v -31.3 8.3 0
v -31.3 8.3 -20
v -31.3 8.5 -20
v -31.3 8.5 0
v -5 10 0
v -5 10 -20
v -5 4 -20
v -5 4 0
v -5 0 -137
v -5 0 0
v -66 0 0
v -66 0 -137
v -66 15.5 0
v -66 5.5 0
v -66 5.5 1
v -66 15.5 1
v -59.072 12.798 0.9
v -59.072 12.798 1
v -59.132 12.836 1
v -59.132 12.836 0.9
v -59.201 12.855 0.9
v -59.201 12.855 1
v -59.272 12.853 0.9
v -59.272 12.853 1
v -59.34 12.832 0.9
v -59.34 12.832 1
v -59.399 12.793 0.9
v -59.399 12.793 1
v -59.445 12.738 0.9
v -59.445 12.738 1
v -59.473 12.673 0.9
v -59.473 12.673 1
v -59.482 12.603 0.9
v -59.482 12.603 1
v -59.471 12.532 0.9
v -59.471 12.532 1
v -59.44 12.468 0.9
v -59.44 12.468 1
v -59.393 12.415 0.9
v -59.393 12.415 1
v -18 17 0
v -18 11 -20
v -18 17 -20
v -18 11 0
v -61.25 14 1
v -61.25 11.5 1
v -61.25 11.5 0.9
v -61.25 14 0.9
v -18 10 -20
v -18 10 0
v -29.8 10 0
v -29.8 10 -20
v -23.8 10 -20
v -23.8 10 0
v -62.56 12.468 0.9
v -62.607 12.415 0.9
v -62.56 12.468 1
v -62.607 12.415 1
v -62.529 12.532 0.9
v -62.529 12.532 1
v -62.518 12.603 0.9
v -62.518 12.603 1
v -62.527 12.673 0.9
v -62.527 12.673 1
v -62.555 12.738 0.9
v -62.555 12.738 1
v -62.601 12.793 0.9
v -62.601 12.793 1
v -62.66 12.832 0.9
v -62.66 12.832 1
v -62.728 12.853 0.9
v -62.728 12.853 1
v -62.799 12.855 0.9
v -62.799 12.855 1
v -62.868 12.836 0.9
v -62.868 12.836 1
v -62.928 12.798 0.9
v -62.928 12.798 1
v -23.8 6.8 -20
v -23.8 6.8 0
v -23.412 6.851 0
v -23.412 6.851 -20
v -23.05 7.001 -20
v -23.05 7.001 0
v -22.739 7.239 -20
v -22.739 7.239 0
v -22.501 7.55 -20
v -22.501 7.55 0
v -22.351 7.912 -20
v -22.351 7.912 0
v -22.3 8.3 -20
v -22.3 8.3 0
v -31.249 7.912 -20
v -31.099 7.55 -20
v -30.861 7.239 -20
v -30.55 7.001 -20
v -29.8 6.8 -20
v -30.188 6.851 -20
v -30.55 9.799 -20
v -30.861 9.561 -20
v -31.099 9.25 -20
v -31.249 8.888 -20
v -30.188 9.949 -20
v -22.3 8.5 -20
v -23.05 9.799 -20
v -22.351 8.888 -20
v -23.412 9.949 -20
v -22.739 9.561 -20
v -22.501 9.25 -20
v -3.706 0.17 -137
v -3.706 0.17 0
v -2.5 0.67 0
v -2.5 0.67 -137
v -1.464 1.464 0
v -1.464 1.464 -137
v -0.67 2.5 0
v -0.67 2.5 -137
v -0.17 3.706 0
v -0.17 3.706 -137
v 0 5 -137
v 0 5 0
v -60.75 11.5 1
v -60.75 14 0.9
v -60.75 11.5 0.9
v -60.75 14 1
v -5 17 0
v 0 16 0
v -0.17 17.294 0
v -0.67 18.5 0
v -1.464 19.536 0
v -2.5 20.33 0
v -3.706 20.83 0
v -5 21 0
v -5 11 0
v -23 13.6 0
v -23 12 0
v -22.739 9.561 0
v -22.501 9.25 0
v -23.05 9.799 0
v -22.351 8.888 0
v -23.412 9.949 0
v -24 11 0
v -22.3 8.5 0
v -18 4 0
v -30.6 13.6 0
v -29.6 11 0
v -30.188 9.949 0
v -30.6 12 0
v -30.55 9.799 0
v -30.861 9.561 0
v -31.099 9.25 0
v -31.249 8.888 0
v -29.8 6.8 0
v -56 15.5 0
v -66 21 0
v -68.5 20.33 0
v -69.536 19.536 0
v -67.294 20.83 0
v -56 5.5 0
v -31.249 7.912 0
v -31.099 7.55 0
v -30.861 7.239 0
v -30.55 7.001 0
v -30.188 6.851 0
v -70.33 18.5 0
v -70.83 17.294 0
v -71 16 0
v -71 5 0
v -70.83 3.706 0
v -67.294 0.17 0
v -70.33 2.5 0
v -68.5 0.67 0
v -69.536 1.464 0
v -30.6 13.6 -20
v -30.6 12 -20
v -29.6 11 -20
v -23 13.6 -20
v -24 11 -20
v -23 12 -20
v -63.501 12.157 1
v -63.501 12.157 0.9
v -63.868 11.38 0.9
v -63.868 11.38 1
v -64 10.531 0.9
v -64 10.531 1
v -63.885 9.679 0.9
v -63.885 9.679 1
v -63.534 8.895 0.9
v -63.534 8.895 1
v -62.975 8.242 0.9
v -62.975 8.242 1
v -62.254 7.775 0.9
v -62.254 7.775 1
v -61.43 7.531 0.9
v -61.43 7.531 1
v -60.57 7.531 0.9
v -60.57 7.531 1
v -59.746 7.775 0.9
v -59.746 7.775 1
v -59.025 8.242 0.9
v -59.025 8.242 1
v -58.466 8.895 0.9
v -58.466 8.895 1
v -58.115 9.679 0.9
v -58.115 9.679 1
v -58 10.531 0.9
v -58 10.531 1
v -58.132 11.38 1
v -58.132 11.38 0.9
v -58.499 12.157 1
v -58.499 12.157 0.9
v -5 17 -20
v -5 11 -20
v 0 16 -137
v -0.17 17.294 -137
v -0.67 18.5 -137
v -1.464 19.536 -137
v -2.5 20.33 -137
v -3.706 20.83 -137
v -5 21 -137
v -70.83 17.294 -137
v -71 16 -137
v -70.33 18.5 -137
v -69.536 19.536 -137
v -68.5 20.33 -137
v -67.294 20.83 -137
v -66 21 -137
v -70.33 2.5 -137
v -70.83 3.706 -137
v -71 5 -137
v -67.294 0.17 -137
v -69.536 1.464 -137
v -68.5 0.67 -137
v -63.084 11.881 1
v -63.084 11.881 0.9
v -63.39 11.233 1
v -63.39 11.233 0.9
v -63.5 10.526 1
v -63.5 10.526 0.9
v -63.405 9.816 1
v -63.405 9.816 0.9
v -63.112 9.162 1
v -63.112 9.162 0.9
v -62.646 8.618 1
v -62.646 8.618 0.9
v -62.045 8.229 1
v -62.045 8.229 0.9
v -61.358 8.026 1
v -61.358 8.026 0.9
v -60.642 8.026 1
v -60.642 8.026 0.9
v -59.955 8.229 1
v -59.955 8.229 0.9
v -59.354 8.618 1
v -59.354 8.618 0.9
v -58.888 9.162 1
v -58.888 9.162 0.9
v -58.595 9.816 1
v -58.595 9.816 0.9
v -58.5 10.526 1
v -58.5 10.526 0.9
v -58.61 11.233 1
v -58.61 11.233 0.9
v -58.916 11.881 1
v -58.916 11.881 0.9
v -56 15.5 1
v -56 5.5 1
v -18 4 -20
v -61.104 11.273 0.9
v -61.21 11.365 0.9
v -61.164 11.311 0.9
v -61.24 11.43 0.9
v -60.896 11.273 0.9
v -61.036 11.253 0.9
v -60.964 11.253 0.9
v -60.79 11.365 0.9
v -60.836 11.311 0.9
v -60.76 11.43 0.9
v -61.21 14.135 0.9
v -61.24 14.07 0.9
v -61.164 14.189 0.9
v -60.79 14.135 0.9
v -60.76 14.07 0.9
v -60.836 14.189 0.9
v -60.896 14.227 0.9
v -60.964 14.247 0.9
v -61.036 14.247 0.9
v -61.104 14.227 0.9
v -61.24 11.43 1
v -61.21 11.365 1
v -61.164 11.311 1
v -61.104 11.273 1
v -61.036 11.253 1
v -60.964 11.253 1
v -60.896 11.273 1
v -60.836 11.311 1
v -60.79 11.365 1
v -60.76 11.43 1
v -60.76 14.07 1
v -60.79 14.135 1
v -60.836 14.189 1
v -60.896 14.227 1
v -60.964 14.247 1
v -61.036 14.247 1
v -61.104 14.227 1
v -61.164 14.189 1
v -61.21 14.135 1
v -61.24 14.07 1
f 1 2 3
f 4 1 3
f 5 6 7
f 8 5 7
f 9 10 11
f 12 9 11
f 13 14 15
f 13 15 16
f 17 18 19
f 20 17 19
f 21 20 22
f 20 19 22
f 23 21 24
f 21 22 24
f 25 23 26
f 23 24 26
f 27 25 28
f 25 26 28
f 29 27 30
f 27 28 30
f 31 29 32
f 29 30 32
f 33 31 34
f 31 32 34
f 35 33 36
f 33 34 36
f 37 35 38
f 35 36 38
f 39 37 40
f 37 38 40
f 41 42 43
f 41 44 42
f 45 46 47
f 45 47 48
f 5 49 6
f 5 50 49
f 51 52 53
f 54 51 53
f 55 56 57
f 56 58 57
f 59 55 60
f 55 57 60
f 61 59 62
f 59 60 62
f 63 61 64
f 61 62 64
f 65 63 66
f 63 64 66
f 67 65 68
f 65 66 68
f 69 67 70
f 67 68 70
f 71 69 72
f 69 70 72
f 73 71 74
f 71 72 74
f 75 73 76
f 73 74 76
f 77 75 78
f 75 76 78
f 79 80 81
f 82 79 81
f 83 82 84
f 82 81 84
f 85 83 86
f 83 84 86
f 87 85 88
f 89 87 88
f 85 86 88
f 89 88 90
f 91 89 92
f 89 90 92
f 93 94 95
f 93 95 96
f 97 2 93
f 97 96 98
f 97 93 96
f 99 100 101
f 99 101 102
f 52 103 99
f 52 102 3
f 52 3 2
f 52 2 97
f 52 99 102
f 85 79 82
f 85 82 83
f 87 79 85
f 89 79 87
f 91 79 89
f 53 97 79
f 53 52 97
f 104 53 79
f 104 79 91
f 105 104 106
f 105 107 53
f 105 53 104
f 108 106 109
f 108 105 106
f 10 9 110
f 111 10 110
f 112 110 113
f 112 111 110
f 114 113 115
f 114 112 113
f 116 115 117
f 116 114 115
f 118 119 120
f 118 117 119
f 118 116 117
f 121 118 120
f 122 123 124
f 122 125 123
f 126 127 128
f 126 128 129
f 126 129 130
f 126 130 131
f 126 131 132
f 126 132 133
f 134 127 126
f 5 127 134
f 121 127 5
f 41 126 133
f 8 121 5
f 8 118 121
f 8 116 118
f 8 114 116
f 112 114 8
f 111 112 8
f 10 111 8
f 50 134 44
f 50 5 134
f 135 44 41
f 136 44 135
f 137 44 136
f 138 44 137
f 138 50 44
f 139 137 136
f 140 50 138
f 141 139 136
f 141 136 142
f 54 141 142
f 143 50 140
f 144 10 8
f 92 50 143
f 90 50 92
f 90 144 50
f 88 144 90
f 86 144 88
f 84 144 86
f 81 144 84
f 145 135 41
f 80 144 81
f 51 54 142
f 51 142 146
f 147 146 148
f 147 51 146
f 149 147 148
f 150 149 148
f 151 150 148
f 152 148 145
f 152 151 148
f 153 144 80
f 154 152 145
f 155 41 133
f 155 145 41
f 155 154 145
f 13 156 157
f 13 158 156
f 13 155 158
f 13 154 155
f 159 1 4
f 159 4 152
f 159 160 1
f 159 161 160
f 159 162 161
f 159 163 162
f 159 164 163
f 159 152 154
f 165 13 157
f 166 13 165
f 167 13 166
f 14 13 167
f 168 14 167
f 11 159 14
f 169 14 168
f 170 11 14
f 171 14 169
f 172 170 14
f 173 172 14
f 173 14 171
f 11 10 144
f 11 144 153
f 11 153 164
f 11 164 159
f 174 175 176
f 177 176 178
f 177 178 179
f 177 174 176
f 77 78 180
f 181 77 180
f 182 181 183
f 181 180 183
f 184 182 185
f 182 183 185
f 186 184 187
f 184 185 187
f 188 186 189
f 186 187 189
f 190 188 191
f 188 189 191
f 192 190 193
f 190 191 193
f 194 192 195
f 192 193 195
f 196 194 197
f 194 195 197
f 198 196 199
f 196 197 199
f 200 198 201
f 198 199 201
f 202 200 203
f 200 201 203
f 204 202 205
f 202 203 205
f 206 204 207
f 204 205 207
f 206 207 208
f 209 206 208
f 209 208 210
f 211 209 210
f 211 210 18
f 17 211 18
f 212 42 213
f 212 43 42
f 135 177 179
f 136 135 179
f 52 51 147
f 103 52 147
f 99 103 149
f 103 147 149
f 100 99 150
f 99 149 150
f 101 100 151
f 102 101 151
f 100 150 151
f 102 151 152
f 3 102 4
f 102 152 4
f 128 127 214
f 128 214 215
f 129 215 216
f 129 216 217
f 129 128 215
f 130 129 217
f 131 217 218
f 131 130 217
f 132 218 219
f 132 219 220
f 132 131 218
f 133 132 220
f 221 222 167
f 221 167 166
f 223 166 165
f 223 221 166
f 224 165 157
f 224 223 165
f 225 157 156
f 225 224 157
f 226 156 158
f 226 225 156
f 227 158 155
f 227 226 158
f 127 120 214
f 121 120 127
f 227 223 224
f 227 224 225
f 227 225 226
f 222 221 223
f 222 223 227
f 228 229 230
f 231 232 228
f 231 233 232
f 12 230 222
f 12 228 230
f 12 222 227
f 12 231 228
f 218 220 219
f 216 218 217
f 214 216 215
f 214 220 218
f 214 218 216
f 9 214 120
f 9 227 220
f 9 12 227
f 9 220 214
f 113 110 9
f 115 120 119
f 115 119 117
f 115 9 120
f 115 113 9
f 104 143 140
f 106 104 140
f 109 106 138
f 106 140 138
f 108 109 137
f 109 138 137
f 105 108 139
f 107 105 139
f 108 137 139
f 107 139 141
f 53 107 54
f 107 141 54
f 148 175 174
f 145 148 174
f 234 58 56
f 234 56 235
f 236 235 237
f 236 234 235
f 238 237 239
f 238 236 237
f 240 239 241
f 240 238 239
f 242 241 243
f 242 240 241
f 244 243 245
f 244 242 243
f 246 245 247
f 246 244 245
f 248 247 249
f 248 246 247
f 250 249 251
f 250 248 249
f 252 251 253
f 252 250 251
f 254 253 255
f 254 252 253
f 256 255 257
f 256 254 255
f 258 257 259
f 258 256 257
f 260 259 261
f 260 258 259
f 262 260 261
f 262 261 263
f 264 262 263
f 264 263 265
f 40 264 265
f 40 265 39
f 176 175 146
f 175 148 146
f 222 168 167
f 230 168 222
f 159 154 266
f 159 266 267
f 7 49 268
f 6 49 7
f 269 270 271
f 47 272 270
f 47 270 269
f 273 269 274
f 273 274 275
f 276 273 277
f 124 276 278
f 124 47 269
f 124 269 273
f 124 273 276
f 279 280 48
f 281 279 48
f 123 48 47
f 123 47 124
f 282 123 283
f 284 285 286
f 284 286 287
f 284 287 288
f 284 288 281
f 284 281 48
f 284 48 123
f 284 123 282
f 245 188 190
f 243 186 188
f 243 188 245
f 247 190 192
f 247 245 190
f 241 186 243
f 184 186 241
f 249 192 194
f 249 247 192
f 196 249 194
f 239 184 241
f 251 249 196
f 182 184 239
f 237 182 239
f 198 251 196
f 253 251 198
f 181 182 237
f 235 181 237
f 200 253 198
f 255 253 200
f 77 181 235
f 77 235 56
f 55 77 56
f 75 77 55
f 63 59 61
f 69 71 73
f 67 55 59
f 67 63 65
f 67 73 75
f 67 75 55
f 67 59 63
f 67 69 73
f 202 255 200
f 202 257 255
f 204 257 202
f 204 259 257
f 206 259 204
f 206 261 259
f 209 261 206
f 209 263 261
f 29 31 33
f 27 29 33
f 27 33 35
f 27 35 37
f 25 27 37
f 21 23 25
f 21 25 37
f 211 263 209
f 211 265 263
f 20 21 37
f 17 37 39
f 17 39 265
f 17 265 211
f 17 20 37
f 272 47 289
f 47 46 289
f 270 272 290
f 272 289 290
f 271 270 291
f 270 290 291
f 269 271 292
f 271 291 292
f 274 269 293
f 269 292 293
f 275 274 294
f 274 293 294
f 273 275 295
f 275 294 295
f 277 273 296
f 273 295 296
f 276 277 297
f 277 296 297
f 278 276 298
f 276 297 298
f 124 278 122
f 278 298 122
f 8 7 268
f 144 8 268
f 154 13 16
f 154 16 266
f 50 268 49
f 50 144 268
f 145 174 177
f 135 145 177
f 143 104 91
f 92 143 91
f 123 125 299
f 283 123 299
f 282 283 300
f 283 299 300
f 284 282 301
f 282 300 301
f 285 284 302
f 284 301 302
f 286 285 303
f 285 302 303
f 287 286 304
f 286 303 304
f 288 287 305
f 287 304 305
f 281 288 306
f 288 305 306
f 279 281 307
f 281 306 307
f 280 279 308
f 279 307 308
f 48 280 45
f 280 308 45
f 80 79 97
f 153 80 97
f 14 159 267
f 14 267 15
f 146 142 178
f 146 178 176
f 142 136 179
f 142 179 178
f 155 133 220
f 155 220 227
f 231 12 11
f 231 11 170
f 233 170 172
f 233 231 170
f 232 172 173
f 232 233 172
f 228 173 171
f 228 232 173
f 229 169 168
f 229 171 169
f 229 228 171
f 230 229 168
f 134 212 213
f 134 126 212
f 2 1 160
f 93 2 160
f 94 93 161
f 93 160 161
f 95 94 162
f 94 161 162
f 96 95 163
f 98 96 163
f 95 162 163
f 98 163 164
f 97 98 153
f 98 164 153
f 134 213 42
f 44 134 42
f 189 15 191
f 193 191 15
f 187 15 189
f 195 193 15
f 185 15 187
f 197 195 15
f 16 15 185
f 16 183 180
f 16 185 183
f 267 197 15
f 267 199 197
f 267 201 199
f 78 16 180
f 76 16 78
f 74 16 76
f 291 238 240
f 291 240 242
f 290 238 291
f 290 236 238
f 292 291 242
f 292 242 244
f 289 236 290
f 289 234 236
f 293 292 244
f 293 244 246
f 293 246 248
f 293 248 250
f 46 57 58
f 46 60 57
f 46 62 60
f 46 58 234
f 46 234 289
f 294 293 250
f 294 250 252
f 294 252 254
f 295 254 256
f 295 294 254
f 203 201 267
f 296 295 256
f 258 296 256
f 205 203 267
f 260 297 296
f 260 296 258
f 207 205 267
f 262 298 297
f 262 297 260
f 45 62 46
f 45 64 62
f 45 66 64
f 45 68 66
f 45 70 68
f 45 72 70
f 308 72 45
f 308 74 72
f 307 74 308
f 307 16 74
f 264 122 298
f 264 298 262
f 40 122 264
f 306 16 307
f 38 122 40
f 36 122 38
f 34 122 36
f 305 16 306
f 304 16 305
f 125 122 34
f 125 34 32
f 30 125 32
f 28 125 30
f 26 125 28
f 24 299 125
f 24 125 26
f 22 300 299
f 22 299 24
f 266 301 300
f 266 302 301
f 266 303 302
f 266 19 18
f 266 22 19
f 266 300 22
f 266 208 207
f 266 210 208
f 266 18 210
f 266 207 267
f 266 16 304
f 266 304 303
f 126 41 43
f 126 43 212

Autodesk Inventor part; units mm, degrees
ref_plane "YZ Plane" through (0, 0, 0) normal (1, 0, 0) x (0, 1, 0)
ref_plane "XZ Plane" through (0, 0, 0) normal (0, 1, 0) x (-1, 0, 0)
ref_plane "XY Plane" through (0, 0, 0) normal (0, 0, 1) x (1, 0, 0)
sketch "Sketch1" plane through (0, 0, 0) normal (0, 1, 0) x (-1, 0, 0)
  line L0 (0, 0) -> (71, 0)
  line L1 (71, 0) -> (71, -137)
  line L2 (71, -137) -> (0, -137)
  line L3 (0, -137) -> (0, 0)
  dimension "d0" = 137
  dimension "d1" = 71
extrude "Extrusion1" add sketch "Sketch1" along normal blind 21
fillet "Fillet1" radius 5 4 edges at (0, 21, -68.5) (0, 0, -68.5) (-71, 21, -68.5) (-71, 0, -68.5)
sketch "Sketch2" plane through (-66, 0, 0) normal (0, 0, 1) x (1, 0, 0)
  line L0 (0, 15.5) -> (10, 15.5)
  line L1 (10, 15.5) -> (10, 5.5)
  line L2 (10, 5.5) -> (0, 5.5)
  line L3 (0, 5.5) -> (0, 15.5)
  line L4 (48, 17) -> (61, 17)
  line L5 (61, 17) -> (61, 11)
  line L6 (61, 11) -> (48, 11)
  line L7 (48, 11) -> (48, 17)
  line L8 (48, 10) -> (61, 10)
  line L9 (61, 10) -> (61, 4)
  line L10 (61, 4) -> (48, 4)
  line L11 (48, 4) -> (48, 10)
  line L12 (66, 5) -> (66, 16) projected
  line L13 (0, 0) -> (61, 0) projected
  line L14 (0, 21) -> (61, 21) projected
  line L15 (-5, 5) -> (-5, 16) projected
  line L16 (35.4, 13.6) -> (43, 13.6)
  line L17 (43, 13.6) -> (43, 11)
  line L18 (43, 11) -> (35.4, 11)
  line L19 (35.4, 11) -> (35.4, 13.6)
  line L20 (36.2, 10) -> (42.2, 10)
  line L21 (43.7, 8.5) -> (43.7, 8.3)
  line L22 (42.2, 6.8) -> (36.2, 6.8)
  line L23 (34.7, 8.3) -> (34.7, 8.5)
  arc A0 (36.2, 10) -> (34.7, 8.5) centre (36.2, 8.5) ccw
  arc A1 (43.7, 8.5) -> (42.2, 10) centre (42.2, 8.5) ccw
  arc A2 (34.7, 8.3) -> (36.2, 6.8) centre (36.2, 8.3) ccw
  arc A3 (42.2, 6.8) -> (43.7, 8.3) centre (42.2, 8.3) ccw
  line L24 (35.4, 12) -> (36.4, 11)
  line L25 (43, 12) -> (42, 11)
  point P0 (66, 0)
  point P1 (0, 10.5)
  point P2 (-5, 10.5)
  point P3 (43.7, 6.8)
  point P4 (34.7, 6.8)
  point P5 (39.2, 11)
  point P6 (39.2, 10)
  dimension "d5" = 6
  dimension "d6" = 6
  dimension "d7" = 13
  dimension "d8" = 5
  dimension "d9" = 4
  dimension "d10" = 4
  dimension "d11" = 5
  dimension "d12" = 10
  dimension "d13" = 10
  dimension "d14" = 7.6
  dimension "d15" = 2.6
  dimension "d16" = 5
  dimension "d17" = 3.2
  dimension "d19" = 9
  dimension "d20" = 1
  dimension "d21" = 1.5
  dimension "d26" = 45
  dimension "d27" = 45
  dimension "d28" = 1
  dimension "d29" = 1
extrude "Extrusion2" cut sketch "Sketch2" against normal blind 20 contours L4 L5 L6 L7 | L8 L9 L10 L11 | L16 L17 L25 L18 L24 L19 | L20 A1 L21 A3 L22 A2 L23 A0
extrude "Extrusion3" add sketch "Sketch2" along normal blind 1 contours L0 L1 L2 L3
sketch "Sketch3" plane through (-66, 0, 1) normal (0, 0, 1) x (1, 0, 0)
  circle A0 centre (5, 10.5) radius 3 construction
  arc A1 (3.0716, 12.7981) -> (6.9284, 12.7981) centre (5, 10.5) ccw
  line L0 (3.0716, 12.7981) -> (5, 10.5) construction
  line L1 (5, 10.5) -> (6.9284, 12.7981) construction
  line L2 (5, 10.5) -> (5, 13.5) construction
  line L3 (10, 5.5) -> (10, 15.5) projected
  line L4 (10, 15.5) -> (0, 15.5) projected
  circle A2 centre (5, 10.5) radius 2.5 construction
  arc A3 (3.393, 12.4151) -> (6.607, 12.4151) centre (5, 10.5) ccw
  arc A4 (3.393, 12.4151) -> (3.0716, 12.7981) centre (3.2323, 12.6066) ccw
  arc A5 (6.9284, 12.7981) -> (6.607, 12.4151) centre (6.7677, 12.6066) ccw
  line L5 (4.75, 14) -> (5.25, 14) construction
  line L6 (5.25, 14) -> (5.25, 11.5)
  line L7 (5.25, 11.5) -> (4.75, 11.5) construction
  line L8 (4.75, 11.5) -> (4.75, 14)
  arc A6 (5.25, 14) -> (4.75, 14) centre (5, 14) ccw
  arc A7 (4.75, 11.5) -> (5.25, 11.5) centre (5, 11.5) ccw
  point P0 (66, 0)
  point P1 (10, 10.5)
  point P2 (5, 15.5)
  dimension "d30" = 40
  dimension "d31" = 40
  dimension "d32" = 6
  dimension "d33" = 0.5
  dimension "d34" = 0.5
  dimension "d35" = 2.5
  dimension "d36" = 1
extrude "Extrusion4" cut sketch "Sketch3" against normal blind 0.1
properties part number "power bank"
